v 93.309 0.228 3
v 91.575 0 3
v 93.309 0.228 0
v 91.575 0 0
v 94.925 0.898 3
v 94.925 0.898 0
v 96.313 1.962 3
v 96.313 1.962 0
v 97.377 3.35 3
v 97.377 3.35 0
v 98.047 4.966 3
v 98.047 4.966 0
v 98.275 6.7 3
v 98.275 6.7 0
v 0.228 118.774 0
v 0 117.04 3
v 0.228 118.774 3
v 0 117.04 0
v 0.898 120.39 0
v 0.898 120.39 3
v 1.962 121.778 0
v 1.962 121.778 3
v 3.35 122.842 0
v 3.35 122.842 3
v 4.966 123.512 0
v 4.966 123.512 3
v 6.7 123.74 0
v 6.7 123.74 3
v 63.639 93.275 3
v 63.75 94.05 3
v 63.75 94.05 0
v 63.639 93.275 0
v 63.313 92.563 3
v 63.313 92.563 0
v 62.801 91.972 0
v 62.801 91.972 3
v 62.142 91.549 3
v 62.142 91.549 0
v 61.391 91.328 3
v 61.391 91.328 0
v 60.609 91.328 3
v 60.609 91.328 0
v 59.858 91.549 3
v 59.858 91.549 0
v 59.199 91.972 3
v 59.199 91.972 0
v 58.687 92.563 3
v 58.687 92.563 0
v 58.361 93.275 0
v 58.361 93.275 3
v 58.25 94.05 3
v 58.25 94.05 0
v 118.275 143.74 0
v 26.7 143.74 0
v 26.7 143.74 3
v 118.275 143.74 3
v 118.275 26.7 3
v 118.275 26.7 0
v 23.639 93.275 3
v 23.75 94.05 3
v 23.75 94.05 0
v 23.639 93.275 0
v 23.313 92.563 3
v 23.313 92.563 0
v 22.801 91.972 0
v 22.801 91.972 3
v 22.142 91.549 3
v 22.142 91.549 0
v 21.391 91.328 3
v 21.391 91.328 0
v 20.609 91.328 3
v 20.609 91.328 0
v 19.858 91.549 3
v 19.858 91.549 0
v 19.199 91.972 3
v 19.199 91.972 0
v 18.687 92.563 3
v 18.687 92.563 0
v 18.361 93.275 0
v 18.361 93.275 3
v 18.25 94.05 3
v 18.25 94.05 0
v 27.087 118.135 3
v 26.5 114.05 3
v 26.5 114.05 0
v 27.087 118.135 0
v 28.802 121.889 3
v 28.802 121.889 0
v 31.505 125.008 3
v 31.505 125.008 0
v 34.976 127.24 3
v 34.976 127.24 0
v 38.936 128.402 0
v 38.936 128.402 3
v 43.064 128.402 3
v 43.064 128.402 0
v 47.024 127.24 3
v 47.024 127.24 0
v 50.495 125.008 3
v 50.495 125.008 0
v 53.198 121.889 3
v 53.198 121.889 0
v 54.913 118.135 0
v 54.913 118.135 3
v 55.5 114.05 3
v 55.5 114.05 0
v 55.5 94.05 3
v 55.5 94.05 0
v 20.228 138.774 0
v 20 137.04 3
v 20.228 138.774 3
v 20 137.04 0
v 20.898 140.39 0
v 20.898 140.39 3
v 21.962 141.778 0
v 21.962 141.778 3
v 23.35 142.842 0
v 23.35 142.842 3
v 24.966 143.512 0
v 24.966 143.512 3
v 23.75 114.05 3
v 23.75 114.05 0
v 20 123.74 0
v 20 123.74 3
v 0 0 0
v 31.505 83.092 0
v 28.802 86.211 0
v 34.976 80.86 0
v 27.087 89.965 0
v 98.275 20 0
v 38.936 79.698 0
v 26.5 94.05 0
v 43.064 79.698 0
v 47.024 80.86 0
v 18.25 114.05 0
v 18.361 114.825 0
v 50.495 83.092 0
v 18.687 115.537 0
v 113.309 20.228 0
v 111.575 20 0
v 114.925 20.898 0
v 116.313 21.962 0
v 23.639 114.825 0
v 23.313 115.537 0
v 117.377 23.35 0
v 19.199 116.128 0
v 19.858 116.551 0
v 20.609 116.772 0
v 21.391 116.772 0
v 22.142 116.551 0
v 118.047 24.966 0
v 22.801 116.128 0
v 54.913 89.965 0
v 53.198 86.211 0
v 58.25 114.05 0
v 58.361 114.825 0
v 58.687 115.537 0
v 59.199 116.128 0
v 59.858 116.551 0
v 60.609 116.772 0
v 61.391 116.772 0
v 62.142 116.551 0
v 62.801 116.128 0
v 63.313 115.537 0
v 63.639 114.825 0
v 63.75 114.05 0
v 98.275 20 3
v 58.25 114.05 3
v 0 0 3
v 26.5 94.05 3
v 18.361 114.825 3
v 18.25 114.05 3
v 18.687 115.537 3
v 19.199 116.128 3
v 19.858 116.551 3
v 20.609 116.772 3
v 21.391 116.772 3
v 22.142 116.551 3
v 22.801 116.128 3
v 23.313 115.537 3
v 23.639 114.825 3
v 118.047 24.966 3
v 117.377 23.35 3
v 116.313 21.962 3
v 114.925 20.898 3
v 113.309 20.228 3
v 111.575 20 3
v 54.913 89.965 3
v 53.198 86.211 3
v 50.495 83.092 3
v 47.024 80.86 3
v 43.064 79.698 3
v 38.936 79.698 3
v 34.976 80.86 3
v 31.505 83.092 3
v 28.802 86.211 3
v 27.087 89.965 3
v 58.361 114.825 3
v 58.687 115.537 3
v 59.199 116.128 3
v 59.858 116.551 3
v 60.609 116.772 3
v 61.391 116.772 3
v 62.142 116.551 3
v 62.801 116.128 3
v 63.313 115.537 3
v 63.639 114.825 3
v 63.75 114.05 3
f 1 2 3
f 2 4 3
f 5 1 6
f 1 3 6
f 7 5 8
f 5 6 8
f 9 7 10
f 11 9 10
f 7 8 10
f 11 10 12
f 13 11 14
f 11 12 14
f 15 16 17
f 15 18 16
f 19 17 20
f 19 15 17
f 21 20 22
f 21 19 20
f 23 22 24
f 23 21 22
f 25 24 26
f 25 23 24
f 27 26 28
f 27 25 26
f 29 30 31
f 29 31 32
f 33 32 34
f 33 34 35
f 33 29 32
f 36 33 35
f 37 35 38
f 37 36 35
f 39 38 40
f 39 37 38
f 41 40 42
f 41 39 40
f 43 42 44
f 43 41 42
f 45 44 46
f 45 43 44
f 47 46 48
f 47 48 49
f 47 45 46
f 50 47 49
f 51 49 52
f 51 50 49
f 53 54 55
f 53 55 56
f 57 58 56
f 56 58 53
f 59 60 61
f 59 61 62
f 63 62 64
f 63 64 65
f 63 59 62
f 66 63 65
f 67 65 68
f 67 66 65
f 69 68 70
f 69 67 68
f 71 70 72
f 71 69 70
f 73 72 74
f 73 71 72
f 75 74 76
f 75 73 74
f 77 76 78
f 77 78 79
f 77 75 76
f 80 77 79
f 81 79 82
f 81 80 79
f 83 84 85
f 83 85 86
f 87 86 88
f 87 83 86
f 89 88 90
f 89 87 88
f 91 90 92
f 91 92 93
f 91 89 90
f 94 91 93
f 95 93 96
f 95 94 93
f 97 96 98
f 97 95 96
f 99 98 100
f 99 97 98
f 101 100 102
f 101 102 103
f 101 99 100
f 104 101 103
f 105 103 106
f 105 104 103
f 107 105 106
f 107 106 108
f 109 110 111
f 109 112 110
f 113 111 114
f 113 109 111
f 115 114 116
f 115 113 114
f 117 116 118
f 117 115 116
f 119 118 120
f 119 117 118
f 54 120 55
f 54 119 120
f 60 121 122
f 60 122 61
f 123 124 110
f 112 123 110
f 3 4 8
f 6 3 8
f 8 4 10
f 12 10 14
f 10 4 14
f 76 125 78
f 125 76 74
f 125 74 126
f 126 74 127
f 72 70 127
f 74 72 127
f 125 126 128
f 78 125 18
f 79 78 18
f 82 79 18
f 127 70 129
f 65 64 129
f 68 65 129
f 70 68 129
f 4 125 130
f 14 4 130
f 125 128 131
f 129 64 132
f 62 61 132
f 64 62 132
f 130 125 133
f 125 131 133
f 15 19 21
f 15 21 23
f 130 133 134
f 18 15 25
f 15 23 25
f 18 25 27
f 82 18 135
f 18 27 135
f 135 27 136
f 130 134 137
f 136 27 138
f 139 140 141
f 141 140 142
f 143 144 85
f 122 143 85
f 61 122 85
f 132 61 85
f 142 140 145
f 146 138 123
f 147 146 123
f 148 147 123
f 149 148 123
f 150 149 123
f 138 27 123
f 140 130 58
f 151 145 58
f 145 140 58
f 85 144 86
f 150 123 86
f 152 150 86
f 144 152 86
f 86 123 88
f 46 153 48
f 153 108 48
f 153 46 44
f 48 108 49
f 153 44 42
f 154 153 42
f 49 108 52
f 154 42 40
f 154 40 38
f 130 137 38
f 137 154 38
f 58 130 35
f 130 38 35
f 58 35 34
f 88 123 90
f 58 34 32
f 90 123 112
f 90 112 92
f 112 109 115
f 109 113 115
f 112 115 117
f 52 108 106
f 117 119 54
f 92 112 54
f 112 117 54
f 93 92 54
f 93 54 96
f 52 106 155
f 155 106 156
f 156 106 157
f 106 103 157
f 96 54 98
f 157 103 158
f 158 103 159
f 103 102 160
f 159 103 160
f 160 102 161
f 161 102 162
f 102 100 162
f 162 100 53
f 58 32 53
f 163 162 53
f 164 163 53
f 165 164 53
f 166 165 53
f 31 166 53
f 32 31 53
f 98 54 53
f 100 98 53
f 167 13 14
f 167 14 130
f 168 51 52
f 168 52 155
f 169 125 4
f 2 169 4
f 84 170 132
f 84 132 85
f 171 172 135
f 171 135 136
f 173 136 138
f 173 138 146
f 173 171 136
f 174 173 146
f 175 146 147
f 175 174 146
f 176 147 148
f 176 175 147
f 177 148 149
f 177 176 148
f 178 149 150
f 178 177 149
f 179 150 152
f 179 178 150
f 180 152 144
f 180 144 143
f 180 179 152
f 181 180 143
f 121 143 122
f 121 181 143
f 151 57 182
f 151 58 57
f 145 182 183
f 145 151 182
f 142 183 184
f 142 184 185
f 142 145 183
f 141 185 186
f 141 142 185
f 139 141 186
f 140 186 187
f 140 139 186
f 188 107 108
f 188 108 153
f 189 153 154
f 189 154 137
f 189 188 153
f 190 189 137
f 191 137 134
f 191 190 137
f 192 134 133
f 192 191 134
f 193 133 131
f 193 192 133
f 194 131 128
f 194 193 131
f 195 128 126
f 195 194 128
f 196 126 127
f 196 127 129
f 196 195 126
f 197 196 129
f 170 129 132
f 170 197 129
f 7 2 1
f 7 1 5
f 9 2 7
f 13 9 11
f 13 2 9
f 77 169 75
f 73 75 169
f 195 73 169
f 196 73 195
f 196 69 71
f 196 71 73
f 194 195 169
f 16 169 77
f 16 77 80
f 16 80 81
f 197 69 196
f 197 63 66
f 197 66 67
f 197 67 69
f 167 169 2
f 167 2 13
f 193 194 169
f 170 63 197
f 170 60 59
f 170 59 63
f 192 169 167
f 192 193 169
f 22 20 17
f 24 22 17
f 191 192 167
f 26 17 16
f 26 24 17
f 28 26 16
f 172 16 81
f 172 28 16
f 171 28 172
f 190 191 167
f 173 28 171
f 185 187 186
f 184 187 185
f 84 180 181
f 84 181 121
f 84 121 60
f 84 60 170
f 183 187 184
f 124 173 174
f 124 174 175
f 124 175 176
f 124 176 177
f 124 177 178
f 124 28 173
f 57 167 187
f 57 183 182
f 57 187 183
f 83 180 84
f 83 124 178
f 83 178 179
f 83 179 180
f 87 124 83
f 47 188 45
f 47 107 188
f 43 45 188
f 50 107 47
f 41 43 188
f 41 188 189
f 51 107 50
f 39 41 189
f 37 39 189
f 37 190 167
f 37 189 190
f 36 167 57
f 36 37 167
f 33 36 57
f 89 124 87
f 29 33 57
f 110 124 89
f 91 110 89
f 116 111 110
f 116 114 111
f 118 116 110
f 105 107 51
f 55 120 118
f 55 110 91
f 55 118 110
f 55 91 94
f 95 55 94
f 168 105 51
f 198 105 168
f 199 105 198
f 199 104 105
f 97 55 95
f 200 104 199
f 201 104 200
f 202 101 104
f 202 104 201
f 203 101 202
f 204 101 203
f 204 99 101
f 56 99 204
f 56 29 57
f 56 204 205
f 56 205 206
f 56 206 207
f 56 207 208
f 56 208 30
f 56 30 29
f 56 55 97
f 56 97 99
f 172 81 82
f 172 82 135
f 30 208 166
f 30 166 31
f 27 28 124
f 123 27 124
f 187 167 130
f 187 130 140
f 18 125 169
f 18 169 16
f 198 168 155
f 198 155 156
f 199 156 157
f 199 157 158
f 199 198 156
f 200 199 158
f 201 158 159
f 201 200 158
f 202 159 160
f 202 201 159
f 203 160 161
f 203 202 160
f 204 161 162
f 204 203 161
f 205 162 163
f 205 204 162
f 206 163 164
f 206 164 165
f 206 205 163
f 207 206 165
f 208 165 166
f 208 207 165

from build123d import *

# Parameters (mm, degrees)
SKETCH1_W           = 118.275
SKETCH1_H           = 143.74
BOSS_EXTRUDE1_DEPTH = 3
CUT_EXTRUDE1_DEPTH  = 3
SKETCH3_W           = 20
SKETCH3_H           = 20
CUT_EXTRUDE2_DEPTH  = 10
FILLET1_R           = 6.7


with BuildPart() as part:
    # Sketch1 → Boss-Extrude1 (new body)
    with BuildSketch(Plane.XY):
        with Locations((59.1375, 71.87)):
            Rectangle(SKETCH1_W, SKETCH1_H)
    extrude(amount=BOSS_EXTRUDE1_DEPTH)

    # Sketch2 → Cut-Extrude1 (cut)
    with BuildSketch(Plane.XY.offset(3)):
        with BuildLine():
            Line((55.5, 114.05), (55.5, 94.05))
            ThreePointArc((55.5, 94.05), (41, 79.55), (26.5, 94.05))
            Line((26.5, 94.05), (26.5, 114.05))
            ThreePointArc((26.5, 114.05), (41, 128.55), (55.5, 114.05))
        make_face()
        with BuildLine():
            Line((63.75, 114.05), (63.75, 94.05))
            ThreePointArc((63.75, 94.05), (61, 91.3), (58.25, 94.05))
            Line((58.25, 94.05), (58.25, 114.05))
            ThreePointArc((58.25, 114.05), (61, 116.8), (63.75, 114.05))
        make_face()
        with BuildLine():
            Line((23.75, 114.05), (23.75, 94.05))
            ThreePointArc((23.75, 94.05), (21, 91.3), (18.25, 94.05))
            Line((18.25, 94.05), (18.25, 114.05))
            ThreePointArc((18.25, 114.05), (21, 116.8), (23.75, 114.05))
        make_face()
    extrude(amount=-CUT_EXTRUDE1_DEPTH, mode=Mode.SUBTRACT)

    # Sketch3 → Cut-Extrude2 (cut)
    with BuildSketch(Plane.XY.offset(3)):
        with Locations((10, 133.74)):
            Rectangle(SKETCH3_W, SKETCH3_H)
        with Locations((108.275, 10)):
            Rectangle(SKETCH3_W, SKETCH3_H)
    extrude(amount=-CUT_EXTRUDE2_DEPTH, mode=Mode.SUBTRACT)

    # Fillet1
    fillet1_edges = [part.edges().sort_by_distance(p)[0] for p in [
        (0, 123.74, 1.5),
        (20, 143.74, 1.5),
        (118.275, 20, 1.5),
        (98.275, 0, 1.5),
    ]]
    fillet(fillet1_edges, radius=FILLET1_R)


solid = part.part
